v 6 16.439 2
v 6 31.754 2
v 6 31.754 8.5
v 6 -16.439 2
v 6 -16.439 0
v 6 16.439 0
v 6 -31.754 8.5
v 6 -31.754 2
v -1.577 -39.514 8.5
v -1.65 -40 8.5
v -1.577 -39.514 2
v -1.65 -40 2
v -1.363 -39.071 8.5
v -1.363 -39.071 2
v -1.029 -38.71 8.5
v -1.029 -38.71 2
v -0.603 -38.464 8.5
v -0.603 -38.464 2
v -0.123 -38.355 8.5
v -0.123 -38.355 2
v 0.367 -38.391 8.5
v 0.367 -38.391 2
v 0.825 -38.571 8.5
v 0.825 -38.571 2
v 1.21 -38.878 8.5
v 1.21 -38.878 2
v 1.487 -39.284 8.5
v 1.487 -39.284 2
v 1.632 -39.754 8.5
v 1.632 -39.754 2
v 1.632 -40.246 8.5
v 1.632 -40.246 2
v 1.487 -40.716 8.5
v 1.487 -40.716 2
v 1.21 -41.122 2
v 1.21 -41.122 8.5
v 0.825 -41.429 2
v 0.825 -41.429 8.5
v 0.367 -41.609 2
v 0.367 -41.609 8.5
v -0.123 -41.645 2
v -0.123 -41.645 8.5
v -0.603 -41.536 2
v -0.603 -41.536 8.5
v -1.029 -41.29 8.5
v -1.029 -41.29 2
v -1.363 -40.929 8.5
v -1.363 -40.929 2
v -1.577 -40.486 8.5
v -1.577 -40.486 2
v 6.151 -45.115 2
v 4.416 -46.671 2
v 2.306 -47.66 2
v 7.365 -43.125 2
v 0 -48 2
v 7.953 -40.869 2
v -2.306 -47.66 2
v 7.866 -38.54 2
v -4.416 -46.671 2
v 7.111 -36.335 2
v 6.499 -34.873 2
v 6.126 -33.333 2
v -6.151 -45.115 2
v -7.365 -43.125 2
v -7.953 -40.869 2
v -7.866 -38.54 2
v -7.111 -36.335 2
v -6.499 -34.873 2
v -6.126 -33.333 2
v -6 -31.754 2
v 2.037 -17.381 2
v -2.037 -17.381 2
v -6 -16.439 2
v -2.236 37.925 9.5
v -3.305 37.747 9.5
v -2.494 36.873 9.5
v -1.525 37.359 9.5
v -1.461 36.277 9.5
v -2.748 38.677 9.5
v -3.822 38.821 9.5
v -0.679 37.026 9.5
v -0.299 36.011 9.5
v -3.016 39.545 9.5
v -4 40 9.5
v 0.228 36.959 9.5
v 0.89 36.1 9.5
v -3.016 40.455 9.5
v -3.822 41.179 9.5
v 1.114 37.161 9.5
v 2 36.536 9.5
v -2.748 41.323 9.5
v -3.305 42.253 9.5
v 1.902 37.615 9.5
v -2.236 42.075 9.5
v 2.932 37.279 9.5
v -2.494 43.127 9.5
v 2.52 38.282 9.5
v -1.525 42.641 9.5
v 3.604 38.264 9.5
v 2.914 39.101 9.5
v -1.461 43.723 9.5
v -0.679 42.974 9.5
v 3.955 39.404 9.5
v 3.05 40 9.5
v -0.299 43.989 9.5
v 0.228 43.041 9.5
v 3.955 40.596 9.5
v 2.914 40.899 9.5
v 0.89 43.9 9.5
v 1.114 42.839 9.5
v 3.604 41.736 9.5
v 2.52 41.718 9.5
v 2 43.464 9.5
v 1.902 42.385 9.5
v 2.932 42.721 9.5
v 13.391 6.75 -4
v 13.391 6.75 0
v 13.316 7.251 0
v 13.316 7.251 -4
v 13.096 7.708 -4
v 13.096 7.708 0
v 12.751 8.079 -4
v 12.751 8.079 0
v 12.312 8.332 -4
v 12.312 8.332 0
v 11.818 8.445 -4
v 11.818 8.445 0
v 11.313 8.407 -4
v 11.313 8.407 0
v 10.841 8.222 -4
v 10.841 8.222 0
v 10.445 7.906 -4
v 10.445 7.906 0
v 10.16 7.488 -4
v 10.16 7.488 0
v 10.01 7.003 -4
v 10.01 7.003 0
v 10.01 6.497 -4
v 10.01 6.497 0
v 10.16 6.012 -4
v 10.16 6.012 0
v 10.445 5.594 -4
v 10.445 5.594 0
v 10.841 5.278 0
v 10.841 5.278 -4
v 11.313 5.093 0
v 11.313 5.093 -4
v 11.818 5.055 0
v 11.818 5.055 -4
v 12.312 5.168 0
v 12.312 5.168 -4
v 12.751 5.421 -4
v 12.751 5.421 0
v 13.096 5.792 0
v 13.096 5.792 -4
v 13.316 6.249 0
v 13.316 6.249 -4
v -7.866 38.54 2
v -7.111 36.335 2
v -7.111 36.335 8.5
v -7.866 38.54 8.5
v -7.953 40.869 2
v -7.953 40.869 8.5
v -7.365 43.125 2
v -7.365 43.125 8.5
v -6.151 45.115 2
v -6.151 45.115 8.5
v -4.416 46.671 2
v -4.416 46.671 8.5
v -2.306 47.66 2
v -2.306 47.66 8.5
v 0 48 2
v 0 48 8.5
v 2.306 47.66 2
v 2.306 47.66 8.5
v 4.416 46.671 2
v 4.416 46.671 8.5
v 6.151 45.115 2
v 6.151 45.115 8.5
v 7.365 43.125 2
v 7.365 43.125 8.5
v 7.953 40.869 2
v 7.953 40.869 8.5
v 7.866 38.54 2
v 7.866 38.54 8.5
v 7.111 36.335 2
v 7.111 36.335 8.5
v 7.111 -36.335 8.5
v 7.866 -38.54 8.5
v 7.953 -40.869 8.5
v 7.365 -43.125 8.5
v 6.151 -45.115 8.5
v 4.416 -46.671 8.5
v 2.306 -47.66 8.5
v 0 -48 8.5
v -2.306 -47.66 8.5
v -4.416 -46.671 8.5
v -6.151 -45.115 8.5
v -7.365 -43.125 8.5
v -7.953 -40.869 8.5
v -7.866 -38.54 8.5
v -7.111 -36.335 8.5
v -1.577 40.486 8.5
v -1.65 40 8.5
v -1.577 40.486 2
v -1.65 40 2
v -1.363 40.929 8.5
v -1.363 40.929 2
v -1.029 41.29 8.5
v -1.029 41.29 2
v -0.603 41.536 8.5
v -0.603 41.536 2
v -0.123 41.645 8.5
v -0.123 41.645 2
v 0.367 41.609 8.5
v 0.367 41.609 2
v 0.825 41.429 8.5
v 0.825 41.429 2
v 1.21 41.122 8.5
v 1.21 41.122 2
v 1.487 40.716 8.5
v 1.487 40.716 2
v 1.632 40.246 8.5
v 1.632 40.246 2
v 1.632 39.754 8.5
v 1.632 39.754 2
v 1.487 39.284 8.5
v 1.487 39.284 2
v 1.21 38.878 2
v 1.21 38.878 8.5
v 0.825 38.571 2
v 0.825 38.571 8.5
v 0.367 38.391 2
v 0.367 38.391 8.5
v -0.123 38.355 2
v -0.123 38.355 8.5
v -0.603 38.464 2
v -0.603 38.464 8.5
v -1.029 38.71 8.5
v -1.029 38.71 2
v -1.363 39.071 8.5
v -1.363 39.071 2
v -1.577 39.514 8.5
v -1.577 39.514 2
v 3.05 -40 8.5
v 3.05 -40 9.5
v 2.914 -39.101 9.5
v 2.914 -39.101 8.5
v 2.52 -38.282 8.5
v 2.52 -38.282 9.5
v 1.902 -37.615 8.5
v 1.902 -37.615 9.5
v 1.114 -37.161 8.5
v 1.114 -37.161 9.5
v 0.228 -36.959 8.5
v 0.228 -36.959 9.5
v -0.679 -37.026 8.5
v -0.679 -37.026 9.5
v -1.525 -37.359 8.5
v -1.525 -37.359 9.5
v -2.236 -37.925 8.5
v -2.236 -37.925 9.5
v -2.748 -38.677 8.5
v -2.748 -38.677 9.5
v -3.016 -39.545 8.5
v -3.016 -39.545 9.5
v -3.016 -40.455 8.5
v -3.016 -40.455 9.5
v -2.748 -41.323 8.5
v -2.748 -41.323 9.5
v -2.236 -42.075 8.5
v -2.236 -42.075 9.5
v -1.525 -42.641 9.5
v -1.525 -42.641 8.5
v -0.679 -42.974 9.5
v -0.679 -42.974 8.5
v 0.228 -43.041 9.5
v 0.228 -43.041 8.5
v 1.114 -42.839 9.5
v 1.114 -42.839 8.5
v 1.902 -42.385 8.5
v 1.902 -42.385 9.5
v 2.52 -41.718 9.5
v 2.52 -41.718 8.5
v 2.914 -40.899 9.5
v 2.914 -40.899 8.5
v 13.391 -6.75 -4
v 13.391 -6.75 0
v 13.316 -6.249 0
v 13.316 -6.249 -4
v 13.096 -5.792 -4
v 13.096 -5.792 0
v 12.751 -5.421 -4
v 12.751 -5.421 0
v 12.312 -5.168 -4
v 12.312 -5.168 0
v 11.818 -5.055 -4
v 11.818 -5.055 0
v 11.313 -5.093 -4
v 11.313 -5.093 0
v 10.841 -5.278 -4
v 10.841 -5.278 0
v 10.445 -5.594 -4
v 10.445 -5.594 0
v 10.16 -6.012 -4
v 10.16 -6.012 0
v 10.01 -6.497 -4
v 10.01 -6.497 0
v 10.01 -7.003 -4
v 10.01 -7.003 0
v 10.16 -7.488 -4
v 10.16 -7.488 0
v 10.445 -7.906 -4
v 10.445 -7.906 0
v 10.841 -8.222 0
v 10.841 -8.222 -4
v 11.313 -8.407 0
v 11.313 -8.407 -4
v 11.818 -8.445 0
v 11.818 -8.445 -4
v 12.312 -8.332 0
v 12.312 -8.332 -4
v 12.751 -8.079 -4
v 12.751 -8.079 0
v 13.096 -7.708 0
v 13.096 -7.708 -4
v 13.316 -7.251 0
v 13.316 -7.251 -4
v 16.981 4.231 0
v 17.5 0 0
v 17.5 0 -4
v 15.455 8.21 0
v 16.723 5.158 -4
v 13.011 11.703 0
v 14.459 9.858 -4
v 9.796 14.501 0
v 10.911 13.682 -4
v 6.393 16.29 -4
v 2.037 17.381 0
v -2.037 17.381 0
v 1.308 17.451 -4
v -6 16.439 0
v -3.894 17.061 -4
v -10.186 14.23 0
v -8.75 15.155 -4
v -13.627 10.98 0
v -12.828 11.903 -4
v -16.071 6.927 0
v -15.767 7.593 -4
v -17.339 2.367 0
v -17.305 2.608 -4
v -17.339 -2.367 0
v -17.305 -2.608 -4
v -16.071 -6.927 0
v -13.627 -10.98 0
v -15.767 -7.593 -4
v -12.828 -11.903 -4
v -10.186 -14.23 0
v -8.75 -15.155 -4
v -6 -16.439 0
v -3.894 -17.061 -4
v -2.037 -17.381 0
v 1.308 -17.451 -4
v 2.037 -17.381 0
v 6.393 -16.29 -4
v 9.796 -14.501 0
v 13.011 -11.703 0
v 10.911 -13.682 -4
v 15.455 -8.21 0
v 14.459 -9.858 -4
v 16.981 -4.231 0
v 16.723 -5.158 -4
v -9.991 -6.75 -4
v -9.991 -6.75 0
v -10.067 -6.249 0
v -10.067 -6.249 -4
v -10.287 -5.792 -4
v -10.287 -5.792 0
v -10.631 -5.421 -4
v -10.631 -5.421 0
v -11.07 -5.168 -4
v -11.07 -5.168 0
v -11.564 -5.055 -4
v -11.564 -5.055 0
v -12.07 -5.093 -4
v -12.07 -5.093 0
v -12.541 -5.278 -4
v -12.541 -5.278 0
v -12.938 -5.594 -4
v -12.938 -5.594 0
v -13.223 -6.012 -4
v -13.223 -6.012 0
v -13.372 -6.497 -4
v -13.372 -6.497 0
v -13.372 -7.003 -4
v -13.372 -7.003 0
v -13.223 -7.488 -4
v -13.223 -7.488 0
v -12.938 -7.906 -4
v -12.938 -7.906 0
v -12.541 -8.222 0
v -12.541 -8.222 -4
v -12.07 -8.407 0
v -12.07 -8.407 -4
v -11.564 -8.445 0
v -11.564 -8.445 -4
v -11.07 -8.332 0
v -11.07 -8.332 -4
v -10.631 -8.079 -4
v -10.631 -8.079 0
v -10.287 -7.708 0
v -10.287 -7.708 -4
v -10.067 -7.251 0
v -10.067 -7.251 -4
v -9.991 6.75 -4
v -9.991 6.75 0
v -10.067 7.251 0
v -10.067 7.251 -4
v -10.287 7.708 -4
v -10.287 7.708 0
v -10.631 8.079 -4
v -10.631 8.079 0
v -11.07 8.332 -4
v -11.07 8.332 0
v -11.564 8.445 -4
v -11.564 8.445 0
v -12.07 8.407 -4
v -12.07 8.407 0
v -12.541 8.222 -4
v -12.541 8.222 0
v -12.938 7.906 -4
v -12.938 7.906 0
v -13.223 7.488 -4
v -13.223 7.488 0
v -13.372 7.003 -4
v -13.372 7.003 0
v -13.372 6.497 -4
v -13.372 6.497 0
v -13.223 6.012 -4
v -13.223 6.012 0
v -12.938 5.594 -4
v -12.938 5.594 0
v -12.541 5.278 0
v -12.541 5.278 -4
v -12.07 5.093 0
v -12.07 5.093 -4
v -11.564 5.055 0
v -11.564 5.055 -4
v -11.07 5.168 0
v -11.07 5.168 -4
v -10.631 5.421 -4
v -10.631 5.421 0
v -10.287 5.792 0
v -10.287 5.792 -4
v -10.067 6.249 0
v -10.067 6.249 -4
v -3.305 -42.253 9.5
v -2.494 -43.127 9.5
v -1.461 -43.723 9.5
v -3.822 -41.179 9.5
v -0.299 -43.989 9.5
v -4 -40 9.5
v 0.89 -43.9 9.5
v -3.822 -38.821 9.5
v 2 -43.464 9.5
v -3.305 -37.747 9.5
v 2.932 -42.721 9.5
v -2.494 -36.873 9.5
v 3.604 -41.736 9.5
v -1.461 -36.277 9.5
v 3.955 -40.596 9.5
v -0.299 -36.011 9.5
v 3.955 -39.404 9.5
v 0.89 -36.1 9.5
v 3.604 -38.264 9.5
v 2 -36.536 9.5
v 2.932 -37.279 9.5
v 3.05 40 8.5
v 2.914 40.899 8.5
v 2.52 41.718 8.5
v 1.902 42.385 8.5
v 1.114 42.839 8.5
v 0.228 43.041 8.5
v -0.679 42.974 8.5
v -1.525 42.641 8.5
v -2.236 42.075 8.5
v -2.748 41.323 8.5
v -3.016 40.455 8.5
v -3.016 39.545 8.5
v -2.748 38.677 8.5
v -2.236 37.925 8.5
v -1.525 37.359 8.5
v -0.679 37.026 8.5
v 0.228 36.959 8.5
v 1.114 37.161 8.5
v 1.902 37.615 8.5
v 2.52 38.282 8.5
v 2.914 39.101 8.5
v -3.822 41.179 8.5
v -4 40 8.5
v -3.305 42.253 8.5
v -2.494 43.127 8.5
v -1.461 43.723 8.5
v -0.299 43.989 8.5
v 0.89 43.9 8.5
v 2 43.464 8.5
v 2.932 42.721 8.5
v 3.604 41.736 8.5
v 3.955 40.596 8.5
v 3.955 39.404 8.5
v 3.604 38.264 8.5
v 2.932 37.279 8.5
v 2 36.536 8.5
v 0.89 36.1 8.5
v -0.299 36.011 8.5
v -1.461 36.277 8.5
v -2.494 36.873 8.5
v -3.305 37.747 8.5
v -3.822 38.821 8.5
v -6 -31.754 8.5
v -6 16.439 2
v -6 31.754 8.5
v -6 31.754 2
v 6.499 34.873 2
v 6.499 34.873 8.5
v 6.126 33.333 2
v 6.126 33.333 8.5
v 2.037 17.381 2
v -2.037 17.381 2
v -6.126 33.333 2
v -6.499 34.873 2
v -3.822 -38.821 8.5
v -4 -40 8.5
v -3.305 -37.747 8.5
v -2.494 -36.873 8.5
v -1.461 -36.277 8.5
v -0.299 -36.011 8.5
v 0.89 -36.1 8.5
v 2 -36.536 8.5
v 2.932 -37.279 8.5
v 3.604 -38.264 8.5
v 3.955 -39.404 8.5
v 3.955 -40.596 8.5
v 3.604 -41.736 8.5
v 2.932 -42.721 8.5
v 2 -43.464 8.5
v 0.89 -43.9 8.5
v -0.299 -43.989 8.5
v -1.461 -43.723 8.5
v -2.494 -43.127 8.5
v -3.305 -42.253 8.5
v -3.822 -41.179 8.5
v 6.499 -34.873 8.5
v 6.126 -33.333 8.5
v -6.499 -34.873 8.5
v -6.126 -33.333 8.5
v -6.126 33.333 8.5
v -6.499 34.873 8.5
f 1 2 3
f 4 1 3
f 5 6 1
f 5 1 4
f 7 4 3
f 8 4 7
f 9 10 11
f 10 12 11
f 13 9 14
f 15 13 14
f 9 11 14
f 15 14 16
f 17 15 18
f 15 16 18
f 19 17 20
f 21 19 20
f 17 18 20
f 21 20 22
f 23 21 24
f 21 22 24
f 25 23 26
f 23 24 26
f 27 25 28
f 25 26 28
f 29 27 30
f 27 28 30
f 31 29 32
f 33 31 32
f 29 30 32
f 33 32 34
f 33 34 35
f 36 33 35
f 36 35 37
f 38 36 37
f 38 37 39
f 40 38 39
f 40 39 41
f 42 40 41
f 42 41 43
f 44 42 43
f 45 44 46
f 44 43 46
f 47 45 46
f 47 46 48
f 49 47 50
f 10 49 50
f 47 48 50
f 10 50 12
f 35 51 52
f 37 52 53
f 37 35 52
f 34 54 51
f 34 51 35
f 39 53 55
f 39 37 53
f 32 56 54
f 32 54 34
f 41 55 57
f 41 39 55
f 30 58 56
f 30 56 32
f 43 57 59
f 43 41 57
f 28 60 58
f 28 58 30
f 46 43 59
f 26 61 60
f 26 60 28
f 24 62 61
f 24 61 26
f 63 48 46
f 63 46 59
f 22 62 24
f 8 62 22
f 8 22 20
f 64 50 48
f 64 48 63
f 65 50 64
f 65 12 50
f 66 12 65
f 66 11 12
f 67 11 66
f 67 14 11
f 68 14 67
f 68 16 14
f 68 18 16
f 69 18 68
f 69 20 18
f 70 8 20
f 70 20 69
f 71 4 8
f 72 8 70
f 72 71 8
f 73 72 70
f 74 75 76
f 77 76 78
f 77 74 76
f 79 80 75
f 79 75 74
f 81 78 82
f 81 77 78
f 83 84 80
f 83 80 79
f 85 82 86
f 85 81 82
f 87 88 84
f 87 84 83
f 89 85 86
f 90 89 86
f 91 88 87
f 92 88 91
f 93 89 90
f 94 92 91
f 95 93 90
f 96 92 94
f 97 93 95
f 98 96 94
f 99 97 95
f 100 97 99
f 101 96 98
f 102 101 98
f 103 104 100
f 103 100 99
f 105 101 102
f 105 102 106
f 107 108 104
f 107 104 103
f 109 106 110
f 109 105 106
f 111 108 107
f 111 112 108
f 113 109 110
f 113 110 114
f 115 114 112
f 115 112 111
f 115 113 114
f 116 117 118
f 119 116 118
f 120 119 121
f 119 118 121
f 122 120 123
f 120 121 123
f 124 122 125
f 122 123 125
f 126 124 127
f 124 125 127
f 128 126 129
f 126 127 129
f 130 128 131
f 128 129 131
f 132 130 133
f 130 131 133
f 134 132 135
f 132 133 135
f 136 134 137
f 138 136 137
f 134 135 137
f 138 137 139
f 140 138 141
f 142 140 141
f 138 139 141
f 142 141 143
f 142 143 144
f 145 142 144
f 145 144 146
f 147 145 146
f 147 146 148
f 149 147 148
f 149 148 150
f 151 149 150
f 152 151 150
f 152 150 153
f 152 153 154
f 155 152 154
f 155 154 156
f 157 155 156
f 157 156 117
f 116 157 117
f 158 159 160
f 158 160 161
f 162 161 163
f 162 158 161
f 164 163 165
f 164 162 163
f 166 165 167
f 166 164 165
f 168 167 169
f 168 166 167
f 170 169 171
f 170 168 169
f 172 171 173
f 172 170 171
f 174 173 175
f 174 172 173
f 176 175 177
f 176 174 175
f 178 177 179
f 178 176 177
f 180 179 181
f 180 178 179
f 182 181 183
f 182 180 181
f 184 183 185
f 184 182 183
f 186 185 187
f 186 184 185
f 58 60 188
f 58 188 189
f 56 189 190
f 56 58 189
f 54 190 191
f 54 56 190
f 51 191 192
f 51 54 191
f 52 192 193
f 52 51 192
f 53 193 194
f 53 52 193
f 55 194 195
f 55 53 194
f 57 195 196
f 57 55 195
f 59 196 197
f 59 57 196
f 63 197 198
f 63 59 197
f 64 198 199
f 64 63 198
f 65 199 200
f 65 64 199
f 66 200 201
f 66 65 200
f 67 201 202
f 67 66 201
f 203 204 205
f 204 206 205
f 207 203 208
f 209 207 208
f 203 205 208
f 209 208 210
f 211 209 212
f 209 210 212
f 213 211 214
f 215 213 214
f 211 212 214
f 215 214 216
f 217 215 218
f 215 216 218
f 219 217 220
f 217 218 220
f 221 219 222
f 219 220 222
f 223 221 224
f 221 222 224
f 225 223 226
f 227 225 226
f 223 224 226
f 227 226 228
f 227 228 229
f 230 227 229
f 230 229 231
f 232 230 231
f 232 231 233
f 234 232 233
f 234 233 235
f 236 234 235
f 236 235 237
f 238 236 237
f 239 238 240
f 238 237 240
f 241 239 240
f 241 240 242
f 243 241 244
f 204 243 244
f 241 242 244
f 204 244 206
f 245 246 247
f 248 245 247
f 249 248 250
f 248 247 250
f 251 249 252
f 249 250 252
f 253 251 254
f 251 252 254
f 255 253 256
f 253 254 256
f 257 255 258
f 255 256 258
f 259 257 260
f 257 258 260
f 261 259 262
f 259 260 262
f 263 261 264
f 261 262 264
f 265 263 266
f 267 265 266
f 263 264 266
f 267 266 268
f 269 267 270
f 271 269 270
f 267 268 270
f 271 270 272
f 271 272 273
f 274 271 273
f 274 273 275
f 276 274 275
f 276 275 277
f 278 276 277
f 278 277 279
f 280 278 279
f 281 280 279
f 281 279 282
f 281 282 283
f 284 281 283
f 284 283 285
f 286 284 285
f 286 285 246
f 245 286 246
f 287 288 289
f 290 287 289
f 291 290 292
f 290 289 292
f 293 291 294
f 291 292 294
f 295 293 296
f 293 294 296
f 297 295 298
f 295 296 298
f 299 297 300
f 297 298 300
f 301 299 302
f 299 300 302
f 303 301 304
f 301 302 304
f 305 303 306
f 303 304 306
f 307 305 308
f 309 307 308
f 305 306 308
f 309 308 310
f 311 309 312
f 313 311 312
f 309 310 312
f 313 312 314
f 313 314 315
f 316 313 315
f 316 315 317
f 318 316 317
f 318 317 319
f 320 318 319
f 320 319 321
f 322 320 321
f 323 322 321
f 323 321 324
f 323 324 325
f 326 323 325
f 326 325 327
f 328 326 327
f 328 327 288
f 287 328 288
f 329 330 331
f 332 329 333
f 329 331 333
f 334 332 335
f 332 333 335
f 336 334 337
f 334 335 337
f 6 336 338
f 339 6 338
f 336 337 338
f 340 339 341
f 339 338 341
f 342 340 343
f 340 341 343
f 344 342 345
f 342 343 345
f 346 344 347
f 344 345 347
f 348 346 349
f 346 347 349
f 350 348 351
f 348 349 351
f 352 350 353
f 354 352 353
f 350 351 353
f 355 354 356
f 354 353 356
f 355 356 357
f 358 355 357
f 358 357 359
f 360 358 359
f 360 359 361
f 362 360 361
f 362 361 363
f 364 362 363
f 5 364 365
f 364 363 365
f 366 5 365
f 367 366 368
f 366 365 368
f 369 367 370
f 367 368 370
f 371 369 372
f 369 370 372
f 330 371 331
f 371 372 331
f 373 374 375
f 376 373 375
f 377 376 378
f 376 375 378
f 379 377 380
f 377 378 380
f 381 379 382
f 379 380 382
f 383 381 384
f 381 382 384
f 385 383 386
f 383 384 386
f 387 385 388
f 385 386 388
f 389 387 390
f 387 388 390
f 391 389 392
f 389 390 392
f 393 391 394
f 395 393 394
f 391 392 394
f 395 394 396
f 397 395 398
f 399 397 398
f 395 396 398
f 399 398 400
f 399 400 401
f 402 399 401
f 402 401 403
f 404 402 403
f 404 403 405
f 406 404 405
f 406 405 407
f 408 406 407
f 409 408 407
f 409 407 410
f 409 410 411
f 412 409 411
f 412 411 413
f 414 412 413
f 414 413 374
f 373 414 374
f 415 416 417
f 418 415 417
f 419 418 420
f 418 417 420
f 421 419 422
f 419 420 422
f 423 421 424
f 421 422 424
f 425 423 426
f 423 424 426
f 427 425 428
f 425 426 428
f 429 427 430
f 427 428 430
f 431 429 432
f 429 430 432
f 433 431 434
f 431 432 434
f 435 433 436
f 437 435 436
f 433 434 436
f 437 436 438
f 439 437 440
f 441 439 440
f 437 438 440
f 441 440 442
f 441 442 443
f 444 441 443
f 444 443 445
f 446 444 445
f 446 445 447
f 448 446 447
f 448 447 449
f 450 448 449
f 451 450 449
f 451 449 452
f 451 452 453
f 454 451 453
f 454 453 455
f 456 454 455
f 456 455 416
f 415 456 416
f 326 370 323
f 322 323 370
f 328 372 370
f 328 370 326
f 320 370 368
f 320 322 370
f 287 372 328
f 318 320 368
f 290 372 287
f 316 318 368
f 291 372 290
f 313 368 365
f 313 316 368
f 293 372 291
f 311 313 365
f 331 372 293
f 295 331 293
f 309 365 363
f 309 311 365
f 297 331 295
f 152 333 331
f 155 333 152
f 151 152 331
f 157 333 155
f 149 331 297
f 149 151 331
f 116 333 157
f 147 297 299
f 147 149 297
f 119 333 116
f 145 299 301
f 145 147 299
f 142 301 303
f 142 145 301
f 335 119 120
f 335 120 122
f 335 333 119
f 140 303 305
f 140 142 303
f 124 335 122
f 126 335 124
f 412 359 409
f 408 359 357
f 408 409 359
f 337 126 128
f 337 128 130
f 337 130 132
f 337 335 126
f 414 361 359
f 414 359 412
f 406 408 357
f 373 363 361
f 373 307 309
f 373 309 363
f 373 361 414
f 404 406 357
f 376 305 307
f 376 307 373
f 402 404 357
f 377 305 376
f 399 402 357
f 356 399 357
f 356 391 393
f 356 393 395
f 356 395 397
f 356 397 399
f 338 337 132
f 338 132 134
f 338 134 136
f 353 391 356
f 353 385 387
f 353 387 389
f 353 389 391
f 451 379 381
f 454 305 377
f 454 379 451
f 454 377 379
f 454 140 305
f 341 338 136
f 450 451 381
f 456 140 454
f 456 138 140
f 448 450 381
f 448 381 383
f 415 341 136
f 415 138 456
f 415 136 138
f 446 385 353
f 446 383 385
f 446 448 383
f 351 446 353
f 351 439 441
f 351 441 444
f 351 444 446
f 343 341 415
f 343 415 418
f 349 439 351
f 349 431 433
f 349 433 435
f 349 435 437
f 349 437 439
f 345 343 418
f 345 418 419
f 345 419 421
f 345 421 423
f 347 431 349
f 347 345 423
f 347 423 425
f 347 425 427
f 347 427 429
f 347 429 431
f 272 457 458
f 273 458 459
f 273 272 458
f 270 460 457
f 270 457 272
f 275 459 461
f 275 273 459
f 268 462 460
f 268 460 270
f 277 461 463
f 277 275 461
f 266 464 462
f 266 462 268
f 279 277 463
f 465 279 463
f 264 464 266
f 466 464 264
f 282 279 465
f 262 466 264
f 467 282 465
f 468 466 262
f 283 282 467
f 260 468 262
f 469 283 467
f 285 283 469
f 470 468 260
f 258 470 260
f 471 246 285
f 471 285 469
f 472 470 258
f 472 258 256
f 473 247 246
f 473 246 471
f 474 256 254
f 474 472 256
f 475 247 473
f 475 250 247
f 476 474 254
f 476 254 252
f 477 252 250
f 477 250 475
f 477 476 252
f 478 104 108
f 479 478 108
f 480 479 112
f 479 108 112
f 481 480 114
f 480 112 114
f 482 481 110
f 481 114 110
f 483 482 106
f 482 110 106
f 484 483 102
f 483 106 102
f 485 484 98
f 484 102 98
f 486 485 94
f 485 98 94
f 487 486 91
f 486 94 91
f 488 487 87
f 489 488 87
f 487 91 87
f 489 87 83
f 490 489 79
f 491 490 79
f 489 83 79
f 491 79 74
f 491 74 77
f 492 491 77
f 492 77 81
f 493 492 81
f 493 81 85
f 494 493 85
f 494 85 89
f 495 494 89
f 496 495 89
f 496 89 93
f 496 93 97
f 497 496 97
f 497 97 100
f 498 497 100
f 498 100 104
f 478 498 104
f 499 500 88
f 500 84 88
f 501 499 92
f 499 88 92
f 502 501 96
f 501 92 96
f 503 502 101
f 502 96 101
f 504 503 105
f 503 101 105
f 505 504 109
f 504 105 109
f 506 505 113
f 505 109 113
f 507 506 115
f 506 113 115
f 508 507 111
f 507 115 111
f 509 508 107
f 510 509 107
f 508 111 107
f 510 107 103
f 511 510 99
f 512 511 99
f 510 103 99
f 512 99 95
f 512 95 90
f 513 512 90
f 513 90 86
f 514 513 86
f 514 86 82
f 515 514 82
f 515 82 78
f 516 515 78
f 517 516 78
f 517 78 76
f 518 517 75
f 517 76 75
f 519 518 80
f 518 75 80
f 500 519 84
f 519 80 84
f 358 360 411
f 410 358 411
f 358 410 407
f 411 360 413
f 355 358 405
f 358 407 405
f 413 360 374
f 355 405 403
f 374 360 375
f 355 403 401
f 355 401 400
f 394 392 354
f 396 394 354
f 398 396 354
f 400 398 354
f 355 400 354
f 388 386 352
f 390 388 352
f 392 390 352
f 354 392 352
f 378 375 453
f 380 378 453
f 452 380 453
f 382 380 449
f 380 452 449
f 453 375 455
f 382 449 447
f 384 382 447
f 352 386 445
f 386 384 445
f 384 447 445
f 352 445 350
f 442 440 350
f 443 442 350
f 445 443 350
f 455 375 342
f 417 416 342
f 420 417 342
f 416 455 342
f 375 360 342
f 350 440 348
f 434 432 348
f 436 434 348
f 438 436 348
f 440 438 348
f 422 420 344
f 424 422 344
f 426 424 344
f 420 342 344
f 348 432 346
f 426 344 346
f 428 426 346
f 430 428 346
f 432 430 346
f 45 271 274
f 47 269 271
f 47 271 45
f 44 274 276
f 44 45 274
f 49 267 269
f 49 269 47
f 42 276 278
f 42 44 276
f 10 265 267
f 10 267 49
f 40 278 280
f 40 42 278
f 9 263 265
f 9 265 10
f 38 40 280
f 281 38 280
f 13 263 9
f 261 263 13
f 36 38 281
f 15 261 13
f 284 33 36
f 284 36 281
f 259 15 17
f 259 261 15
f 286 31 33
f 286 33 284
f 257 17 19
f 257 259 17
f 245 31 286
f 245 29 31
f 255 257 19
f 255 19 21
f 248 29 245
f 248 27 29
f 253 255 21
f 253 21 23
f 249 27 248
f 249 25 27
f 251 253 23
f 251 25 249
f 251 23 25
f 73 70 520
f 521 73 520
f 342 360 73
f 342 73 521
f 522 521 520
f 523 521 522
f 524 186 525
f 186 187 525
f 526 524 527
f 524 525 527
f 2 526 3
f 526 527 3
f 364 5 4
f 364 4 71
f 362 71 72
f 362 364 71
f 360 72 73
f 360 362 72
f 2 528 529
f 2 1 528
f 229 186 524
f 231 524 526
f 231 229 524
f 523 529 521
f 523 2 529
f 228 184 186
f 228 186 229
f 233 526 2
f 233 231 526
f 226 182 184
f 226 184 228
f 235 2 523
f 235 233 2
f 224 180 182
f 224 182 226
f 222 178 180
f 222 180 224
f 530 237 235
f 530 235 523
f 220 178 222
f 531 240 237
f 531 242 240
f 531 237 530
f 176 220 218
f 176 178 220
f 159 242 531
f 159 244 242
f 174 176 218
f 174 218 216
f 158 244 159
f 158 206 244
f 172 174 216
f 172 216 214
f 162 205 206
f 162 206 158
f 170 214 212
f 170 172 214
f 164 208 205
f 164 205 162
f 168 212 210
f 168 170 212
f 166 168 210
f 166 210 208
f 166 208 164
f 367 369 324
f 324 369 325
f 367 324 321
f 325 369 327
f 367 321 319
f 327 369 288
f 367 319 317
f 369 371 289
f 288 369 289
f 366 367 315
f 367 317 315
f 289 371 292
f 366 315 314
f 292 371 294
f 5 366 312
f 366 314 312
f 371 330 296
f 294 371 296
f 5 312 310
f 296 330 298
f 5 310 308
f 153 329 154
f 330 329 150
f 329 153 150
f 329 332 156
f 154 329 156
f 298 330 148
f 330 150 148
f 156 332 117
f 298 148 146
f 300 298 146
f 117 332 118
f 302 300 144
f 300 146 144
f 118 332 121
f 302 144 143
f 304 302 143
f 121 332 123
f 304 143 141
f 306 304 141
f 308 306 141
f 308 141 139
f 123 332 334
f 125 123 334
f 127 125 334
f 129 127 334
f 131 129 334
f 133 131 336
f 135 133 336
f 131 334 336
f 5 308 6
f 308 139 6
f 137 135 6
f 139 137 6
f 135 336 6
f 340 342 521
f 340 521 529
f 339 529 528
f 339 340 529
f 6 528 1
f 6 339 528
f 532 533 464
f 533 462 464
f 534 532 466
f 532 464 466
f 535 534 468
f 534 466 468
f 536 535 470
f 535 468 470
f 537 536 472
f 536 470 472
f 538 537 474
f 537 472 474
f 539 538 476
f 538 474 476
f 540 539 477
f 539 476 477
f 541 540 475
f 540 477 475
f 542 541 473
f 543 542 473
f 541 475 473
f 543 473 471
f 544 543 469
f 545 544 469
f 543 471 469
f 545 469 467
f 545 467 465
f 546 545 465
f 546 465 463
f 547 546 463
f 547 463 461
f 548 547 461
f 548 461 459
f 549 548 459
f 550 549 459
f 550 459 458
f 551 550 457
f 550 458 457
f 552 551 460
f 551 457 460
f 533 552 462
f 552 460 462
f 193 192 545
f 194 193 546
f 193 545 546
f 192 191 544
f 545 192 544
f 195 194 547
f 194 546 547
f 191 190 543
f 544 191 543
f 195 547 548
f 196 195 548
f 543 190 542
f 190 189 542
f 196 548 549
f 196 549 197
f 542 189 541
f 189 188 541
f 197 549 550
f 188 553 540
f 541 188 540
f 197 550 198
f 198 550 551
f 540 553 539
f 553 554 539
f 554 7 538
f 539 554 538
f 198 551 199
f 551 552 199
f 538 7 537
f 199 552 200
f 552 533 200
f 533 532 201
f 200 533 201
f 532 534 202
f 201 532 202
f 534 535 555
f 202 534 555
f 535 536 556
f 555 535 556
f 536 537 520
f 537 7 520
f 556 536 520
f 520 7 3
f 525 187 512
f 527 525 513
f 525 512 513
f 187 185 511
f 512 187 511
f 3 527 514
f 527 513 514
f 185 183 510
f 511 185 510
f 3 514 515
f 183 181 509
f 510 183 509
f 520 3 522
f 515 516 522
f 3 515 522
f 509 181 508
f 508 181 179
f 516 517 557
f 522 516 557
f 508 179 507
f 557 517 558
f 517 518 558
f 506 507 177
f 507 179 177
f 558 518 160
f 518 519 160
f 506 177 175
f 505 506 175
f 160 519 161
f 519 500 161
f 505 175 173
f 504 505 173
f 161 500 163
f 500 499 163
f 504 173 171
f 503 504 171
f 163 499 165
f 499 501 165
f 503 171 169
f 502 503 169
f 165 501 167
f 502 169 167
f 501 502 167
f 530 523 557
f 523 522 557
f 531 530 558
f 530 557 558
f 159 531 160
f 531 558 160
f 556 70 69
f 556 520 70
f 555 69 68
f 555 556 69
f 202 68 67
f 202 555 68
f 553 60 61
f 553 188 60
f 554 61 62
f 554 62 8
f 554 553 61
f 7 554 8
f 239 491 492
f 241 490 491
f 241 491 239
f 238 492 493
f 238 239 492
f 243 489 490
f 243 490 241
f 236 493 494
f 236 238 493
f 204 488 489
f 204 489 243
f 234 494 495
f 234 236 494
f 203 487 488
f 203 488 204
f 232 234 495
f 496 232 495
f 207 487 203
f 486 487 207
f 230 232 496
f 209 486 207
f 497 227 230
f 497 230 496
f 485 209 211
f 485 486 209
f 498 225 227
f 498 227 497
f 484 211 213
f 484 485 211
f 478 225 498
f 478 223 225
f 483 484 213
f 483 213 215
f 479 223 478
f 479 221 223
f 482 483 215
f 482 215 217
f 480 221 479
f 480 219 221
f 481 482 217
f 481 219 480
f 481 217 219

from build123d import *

# Parameters (mm, degrees)
SKETCH_1_W                   = 17.5
SKETCH_1_H                   = 4
EXTRUDE_1_DEPTH              = 2
EXTRUDE_2_DEPTH              = 6.5
SKETCH_4_W                   = 4
SKETCH_4_H                   = 1
SKETCH_5_W                   = 4
SKETCH_5_H                   = 1
HOLE_WIZARD_3_4_3_4_1_D      = 3.4
HOLE_WIZARD_3_4_3_4_1_DEPTH  = 13.5
HOLE_WIZARD_M3_1_D           = 3.3
HOLE_WIZARD_M3_1_DEPTH       = 13.5
HOLE_WIZARD_M3_1_CBORE_D     = 6.1
HOLE_WIZARD_M3_1_CBORE_DEPTH = 1
FILLET_1_R                   = 10


with BuildPart() as part:
    # 草图1 → 旋转1 (revolve)
    with BuildSketch(Plane(origin=(0, 0, 0), x_dir=(1, 0, 0), z_dir=(0, 1, 0))):
        with Locations((8.75, 2)):
            Rectangle(SKETCH_1_W, SKETCH_1_H)
    revolve(axis=Axis((0, 0, -4), (0, 0, 1)))

    # 草图2 → 凸台-拉伸1 (add)
    with BuildSketch(Plane.XY):
        with BuildLine():
            Line((6, 16.439282223), (6, -16.439282223))
            ThreePointArc((6, -16.439282223), (0, -17.5), (-6, -16.439282223))
            Line((-6, -16.439282223), (-6, 16.439282223))
            ThreePointArc((-6, 16.439282223), (0, 17.5), (6, 16.439282223))
        make_face()
    extrude(amount=EXTRUDE_1_DEPTH)

    # 草图3 → 凸台-拉伸2 (add)
    with BuildSketch(Plane.XY.offset(2)):
        with BuildLine():
            Line((-6, -34.708497378), (-6, 34.708497378))
            ThreePointArc((-6, 34.708497378), (0, 48), (6, 34.708497378))
            Line((6, 34.708497378), (6, -34.708497378))
            ThreePointArc((6, -34.708497378), (0, -48), (-6, -34.708497378))
        make_face()
    extrude(amount=EXTRUDE_2_DEPTH)

    # 草图4 → 旋转2 (revolve)
    with BuildSketch(Plane.XZ.offset(40), mode=Mode.PRIVATE) as revolve_2_sk:
        with Locations((2, 9)):
            Rectangle(SKETCH_4_W, SKETCH_4_H)
    revolve(revolve_2_sk.sketch.rotate(Axis((0, -40, 9.5), (0, 0, -1)), 180), axis=Axis((0, -40, 9.5), (0, 0, -1)))

    # 草图5 → 旋转3 (revolve)
    with BuildSketch(Plane.XZ.offset(-40), mode=Mode.PRIVATE) as revolve_3_sk:
        with Locations((2, 9)):
            Rectangle(SKETCH_5_W, SKETCH_5_H)
    revolve(revolve_3_sk.sketch.rotate(Axis((0, 40, 9.5), (0, 0, -1)), 180), axis=Axis((0, 40, 9.5), (0, 0, -1)))

    # Ø3.4 (3.4) 直径孔1
    with Locations(Plane(origin=(0, 0, -4), x_dir=(-1, 0, 0), z_dir=(0, 0, -1))):
        with Locations((11.691342951, 6.75), (11.691342951, -6.75), (-11.691342951, -6.75), (-11.691342951, 6.75)):
            Hole(HOLE_WIZARD_3_4_3_4_1_D / 2, depth=HOLE_WIZARD_3_4_3_4_1_DEPTH)

    # M3 六角头机械螺钉的柱形沉头孔1
    with Locations(Plane.XY.offset(9.5)):
        with Locations((0, -40), (0, 40)):
            CounterBoreHole(HOLE_WIZARD_M3_1_D / 2, HOLE_WIZARD_M3_1_CBORE_D / 2, HOLE_WIZARD_M3_1_CBORE_DEPTH, depth=HOLE_WIZARD_M3_1_DEPTH)

    # 圆角1
    fillet_1_edges = [part.edges().sort_by_distance(p)[0] for p in [
        (-6, -34.708497378, 5.25),
        (6, -34.708497378, 5.25),
        (6, 34.708497378, 5.25),
        (-6, 34.708497378, 5.25),
    ]]
    fillet(fillet_1_edges, radius=FILLET_1_R)


solid = part.part
